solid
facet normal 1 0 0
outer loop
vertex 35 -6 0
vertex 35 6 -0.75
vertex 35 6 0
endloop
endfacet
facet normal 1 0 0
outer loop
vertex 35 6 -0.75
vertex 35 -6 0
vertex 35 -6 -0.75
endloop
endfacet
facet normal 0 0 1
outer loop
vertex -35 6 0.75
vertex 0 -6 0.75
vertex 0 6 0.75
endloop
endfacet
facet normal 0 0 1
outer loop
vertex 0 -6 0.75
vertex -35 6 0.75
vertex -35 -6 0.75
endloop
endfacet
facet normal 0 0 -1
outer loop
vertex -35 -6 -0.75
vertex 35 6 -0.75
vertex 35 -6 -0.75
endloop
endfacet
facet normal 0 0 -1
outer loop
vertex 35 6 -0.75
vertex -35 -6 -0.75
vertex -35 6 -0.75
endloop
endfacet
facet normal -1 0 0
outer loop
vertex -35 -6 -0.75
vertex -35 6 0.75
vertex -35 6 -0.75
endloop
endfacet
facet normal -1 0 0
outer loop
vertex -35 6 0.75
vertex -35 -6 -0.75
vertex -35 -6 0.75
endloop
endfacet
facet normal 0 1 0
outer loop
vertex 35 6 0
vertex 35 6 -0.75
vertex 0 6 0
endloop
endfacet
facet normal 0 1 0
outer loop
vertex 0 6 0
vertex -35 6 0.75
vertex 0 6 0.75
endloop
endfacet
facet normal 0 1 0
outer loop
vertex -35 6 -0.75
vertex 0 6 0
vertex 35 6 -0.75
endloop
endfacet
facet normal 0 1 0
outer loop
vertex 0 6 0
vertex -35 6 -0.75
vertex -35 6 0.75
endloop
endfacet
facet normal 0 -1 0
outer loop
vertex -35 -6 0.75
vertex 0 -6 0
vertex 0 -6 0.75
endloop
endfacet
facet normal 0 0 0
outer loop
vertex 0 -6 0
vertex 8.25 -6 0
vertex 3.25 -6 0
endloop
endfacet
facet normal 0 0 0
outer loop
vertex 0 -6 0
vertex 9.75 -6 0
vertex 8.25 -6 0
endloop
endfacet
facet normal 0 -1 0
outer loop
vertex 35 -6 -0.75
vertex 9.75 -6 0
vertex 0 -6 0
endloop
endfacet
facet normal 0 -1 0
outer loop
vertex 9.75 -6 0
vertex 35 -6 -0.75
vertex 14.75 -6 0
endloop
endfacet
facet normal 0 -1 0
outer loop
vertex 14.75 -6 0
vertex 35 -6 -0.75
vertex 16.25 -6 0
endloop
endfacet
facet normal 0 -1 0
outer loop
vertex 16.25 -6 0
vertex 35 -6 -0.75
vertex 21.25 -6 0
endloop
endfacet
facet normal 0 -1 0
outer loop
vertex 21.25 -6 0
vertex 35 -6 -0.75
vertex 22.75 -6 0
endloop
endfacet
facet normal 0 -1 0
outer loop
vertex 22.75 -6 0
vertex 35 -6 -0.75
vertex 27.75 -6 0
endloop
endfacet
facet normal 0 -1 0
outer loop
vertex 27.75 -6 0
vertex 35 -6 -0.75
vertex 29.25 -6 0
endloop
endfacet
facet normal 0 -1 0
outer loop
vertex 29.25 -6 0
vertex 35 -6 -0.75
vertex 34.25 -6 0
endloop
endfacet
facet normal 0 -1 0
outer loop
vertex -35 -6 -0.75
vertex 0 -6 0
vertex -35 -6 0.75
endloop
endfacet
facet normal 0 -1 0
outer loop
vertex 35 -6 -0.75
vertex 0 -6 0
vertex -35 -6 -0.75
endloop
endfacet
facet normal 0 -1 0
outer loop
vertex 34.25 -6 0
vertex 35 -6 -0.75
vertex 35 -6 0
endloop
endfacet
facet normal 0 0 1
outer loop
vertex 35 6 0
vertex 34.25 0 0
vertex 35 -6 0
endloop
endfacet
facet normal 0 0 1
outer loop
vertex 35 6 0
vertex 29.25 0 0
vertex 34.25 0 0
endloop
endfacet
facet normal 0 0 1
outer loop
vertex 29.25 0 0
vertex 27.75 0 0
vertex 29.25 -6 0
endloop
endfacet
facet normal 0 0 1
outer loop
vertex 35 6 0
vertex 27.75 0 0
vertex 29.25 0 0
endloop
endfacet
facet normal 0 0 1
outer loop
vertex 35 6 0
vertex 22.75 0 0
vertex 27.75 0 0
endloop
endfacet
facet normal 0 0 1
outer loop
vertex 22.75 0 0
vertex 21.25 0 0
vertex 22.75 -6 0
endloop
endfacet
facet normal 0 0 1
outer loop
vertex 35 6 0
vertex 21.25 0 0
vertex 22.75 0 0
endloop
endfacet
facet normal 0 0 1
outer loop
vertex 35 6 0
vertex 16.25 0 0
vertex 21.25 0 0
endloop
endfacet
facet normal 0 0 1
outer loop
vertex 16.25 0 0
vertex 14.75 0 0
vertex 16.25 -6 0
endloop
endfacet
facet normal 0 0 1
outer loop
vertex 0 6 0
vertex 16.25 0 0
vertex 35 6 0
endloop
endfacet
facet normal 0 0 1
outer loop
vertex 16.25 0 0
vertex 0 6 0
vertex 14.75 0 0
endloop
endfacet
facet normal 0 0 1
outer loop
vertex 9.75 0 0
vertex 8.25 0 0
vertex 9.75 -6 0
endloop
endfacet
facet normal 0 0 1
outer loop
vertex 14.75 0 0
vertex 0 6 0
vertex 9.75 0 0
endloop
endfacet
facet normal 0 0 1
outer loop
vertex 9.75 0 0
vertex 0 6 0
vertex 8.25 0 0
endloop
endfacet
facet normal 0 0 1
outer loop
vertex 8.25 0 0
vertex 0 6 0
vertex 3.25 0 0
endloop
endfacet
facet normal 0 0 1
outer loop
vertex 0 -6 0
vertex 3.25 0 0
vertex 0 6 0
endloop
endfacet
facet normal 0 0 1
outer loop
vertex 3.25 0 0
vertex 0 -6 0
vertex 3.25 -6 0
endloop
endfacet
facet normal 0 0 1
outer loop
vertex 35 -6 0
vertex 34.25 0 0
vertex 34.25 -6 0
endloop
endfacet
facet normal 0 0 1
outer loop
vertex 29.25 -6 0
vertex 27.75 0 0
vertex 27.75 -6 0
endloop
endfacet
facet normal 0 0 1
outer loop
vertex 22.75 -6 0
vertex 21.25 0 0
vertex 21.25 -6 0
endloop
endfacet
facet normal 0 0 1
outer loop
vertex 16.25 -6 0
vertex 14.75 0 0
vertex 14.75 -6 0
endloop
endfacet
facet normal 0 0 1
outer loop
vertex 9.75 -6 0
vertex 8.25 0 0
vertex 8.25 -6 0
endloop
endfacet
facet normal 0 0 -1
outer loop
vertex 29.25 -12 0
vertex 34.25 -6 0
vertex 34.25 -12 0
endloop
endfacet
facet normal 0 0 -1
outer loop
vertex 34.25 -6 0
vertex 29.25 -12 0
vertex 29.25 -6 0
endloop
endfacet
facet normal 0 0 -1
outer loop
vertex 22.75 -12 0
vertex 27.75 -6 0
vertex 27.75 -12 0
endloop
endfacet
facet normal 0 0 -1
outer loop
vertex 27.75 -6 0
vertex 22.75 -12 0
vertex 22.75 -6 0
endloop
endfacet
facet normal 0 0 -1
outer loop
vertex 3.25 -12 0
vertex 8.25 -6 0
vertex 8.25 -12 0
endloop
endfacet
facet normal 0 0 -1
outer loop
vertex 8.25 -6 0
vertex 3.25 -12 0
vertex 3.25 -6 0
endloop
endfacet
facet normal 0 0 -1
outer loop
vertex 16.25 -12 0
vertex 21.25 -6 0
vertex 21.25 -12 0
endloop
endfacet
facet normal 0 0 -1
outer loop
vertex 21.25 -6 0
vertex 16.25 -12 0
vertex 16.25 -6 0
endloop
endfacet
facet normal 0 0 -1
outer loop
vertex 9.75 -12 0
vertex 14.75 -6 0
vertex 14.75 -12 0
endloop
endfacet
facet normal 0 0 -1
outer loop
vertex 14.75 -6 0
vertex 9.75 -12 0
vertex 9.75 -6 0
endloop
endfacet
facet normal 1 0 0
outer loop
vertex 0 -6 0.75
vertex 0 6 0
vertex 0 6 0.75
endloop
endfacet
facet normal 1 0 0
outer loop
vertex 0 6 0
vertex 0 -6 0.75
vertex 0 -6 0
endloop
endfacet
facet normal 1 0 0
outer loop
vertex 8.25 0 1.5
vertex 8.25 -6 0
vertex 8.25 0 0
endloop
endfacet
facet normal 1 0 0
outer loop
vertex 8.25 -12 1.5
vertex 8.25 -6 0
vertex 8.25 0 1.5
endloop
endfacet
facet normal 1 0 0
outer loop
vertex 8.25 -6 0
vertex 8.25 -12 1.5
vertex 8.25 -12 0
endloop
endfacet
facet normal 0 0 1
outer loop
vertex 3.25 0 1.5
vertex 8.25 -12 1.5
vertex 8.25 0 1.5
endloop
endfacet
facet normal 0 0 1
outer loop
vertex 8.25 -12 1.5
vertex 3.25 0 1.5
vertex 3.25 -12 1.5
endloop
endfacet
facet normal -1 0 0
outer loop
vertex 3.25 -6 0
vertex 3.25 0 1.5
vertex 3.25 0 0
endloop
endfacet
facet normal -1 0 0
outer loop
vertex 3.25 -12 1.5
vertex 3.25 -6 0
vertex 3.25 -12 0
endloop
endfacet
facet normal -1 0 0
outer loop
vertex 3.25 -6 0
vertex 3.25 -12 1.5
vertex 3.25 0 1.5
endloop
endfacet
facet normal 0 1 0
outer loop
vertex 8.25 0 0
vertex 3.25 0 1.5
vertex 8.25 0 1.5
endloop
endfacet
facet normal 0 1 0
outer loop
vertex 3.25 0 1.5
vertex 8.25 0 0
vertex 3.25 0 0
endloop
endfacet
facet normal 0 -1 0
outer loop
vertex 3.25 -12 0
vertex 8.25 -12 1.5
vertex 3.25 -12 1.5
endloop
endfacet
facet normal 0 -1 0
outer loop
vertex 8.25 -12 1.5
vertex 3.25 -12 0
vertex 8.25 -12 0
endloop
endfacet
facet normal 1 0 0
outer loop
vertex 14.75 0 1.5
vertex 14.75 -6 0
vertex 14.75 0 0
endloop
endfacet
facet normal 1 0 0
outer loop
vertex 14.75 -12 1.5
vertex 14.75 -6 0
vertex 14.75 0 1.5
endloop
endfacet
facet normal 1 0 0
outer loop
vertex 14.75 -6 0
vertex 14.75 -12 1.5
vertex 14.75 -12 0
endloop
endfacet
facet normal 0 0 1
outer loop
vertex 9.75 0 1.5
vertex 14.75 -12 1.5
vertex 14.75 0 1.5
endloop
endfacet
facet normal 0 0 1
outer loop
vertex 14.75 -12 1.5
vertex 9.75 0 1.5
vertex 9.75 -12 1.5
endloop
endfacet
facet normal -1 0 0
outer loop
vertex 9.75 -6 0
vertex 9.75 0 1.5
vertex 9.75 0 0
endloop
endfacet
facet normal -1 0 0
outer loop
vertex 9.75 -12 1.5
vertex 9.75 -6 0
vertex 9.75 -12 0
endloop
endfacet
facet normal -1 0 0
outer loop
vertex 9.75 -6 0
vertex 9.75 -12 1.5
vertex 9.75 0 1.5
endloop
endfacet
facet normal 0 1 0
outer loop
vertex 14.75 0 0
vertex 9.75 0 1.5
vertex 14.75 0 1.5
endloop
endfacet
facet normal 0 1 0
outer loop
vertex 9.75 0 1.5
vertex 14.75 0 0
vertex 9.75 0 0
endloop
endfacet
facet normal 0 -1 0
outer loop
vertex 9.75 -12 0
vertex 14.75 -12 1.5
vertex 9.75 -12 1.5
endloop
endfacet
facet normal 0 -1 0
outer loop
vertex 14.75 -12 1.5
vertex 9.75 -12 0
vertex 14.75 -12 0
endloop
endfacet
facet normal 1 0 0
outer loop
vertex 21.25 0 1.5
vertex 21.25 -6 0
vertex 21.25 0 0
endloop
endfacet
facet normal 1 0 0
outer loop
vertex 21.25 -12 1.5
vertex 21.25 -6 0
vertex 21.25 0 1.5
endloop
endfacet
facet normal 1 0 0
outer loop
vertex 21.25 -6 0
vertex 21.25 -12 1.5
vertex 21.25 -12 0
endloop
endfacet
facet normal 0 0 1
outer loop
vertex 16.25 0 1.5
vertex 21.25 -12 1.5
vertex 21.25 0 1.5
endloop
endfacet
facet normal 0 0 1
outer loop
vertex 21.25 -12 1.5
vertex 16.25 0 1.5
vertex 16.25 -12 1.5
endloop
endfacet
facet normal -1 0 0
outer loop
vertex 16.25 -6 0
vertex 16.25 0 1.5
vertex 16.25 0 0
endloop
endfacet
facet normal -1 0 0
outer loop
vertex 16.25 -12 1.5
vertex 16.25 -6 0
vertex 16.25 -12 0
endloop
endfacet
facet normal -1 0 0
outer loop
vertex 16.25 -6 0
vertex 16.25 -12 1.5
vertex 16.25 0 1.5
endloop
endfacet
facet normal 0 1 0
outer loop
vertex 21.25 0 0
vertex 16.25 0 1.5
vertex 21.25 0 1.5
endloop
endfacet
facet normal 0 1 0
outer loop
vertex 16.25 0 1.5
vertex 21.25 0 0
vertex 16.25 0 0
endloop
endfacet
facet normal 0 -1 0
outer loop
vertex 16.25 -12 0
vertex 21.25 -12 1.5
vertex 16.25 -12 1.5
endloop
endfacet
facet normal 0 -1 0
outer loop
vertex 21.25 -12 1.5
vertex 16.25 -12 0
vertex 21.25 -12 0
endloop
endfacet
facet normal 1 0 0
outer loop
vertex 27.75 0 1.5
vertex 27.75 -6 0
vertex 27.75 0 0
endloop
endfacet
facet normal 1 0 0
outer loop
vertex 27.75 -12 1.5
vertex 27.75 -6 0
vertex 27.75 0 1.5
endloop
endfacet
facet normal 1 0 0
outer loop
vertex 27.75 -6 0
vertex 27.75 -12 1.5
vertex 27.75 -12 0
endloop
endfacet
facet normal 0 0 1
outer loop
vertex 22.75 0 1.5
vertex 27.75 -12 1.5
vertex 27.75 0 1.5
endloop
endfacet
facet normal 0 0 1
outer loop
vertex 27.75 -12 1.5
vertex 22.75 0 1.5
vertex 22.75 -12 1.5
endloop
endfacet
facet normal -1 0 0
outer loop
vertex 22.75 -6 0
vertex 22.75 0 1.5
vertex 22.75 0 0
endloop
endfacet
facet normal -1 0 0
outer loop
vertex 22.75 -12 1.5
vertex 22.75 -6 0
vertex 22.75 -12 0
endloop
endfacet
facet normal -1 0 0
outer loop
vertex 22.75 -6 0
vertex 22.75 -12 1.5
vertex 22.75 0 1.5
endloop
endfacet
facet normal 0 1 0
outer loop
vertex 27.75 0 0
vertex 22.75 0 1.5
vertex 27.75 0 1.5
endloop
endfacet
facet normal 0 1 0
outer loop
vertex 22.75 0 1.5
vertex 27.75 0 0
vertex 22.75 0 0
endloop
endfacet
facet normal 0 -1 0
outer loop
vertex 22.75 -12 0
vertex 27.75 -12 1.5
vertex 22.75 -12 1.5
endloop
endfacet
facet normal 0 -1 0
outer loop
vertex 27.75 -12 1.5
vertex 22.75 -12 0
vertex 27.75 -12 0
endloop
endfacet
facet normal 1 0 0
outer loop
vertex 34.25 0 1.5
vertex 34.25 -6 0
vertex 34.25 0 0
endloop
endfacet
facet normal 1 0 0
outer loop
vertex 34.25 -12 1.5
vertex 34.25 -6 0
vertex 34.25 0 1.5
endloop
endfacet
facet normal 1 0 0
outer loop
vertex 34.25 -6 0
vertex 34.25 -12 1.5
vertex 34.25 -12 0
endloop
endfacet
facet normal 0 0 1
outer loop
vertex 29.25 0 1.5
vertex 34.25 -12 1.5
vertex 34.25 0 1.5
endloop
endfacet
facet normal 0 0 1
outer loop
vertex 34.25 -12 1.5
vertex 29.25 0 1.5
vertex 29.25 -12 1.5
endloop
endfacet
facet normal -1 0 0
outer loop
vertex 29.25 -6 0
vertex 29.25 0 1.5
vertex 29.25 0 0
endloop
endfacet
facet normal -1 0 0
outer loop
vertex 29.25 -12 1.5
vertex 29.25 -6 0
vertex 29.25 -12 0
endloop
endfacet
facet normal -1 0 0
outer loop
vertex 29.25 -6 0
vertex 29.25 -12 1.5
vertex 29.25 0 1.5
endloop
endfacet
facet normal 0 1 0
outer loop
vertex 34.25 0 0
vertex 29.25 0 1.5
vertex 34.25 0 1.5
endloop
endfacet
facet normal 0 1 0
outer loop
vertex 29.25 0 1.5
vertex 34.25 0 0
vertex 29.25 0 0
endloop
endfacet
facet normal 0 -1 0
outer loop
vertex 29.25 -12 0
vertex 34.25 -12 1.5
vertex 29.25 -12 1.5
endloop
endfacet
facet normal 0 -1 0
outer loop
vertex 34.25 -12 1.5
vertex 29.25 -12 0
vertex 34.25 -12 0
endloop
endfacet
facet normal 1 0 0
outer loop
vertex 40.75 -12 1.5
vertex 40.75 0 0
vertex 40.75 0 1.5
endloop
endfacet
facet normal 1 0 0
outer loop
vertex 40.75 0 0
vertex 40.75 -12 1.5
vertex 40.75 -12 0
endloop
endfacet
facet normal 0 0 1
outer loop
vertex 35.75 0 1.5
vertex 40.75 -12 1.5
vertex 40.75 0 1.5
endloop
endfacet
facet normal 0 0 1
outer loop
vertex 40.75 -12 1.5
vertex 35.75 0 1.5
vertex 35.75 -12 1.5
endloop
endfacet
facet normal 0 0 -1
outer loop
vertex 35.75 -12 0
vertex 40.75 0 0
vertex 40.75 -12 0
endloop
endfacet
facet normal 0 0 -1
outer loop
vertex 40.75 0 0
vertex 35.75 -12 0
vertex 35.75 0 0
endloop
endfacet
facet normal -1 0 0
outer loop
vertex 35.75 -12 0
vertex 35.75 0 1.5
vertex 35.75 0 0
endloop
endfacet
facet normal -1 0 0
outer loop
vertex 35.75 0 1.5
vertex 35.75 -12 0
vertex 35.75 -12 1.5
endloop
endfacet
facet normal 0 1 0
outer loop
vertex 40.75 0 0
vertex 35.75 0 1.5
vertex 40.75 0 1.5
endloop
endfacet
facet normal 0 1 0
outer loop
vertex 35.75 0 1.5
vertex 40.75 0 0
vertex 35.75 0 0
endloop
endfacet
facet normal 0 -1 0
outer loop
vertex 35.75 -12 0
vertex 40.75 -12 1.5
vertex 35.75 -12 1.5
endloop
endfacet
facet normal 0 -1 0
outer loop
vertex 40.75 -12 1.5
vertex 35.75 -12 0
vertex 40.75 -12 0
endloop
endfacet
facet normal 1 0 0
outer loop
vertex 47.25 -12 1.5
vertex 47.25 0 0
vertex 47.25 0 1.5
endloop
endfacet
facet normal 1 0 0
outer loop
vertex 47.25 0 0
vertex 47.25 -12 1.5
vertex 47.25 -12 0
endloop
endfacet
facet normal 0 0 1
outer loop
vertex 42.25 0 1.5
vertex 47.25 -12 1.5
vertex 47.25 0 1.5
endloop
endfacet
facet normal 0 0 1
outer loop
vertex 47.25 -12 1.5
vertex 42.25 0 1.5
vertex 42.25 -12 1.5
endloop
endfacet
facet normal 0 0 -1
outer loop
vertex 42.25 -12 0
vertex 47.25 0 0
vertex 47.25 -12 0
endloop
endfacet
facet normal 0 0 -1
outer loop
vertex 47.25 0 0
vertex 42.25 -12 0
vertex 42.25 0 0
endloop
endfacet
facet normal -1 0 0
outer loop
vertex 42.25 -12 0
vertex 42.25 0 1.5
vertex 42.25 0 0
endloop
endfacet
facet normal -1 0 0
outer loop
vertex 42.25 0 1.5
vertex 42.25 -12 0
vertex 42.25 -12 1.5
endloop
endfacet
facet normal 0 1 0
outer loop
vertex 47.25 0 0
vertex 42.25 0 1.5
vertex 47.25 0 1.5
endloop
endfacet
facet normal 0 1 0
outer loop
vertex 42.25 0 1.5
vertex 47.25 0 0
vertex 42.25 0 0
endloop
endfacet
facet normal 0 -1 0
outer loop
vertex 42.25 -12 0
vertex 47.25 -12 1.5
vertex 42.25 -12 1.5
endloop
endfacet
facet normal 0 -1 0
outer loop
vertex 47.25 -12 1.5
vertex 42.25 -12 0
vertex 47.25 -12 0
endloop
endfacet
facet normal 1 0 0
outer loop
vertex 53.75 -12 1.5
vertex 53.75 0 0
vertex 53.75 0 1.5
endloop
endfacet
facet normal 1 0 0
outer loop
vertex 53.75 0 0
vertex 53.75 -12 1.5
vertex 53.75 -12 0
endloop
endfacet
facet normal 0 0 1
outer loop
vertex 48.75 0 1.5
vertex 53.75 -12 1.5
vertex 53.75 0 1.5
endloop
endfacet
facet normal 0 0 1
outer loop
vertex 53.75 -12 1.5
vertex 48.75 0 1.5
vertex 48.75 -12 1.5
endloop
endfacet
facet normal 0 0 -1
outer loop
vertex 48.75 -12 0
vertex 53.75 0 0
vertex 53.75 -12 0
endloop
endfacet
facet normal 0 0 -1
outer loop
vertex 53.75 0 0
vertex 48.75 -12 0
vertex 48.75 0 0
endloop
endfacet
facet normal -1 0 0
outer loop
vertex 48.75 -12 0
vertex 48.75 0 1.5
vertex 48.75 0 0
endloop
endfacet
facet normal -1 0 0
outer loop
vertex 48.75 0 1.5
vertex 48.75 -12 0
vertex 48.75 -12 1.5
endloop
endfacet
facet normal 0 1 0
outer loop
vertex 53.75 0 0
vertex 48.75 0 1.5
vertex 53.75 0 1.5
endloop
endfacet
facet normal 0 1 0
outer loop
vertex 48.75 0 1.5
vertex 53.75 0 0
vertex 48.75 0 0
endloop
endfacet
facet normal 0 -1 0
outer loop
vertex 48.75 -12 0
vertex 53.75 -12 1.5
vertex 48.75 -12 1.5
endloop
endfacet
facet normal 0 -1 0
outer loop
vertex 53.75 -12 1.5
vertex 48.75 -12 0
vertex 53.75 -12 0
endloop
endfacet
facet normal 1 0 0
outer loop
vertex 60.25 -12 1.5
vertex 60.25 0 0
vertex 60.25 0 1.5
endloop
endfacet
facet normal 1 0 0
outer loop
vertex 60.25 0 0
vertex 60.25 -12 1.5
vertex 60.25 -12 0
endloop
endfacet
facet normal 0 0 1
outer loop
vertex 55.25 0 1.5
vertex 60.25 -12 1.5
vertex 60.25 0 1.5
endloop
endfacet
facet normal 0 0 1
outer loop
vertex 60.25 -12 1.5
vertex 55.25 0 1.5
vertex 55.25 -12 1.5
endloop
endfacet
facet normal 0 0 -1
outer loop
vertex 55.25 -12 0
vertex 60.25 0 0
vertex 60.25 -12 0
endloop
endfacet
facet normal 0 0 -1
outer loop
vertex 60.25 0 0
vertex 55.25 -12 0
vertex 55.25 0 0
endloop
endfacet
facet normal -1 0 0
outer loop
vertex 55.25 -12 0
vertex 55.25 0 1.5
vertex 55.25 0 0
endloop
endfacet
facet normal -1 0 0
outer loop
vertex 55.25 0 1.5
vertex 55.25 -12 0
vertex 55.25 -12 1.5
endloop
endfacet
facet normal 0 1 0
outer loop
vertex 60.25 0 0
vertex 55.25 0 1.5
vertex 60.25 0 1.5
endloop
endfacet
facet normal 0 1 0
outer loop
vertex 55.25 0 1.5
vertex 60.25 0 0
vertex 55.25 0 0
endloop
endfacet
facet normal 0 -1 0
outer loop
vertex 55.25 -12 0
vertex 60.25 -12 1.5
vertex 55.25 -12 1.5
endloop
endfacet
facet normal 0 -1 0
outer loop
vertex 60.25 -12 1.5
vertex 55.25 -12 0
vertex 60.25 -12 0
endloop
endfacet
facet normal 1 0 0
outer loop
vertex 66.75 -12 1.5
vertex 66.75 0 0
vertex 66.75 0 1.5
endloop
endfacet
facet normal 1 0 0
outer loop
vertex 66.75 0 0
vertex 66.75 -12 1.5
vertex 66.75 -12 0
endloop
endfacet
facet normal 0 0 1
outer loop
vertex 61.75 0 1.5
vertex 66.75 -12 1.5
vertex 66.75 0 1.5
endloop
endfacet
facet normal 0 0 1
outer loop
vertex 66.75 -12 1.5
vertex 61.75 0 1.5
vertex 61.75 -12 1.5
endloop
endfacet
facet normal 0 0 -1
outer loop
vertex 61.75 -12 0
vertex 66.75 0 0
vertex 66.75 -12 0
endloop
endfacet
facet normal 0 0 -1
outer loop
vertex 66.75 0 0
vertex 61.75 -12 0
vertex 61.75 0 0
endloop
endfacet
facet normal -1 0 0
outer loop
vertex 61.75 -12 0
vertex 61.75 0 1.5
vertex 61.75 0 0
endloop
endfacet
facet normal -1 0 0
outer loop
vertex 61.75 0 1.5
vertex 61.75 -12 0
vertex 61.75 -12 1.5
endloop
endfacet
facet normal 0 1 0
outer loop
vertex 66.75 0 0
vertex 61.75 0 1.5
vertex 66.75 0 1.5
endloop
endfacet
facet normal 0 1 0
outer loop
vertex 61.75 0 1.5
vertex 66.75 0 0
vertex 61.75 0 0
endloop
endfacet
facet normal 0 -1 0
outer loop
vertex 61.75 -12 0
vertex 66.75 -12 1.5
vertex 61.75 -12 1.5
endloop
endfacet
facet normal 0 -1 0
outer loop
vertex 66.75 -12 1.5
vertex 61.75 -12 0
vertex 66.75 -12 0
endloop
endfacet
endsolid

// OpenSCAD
// 10-well Agarose Gel Comb
// Designed for FDM printing, lying flat on the XY plane (Z=0).
// Dimensions in millimetres.

// --- Dimensions ---
$fn = 100; // High resolution for smooth edges

// Spine dimensions
SPINE_LENGTH = 70;  // X
SPINE_WIDTH = 12;   // Y
PLATE_THICKNESS = 1.5; // Z

// Tooth dimensions
TOOTH_WIDTH = 5.0;  // X
TOOTH_LENGTH = 12;  // Y (extends from spine edge)
NUM_TEETH = 10;
GAP_SIZE = 1.5;     // Gap between teeth

// --- Calculations ---
// Total width of the tooth row
TOOTH_ROW_WIDTH = (NUM_TEETH * TOOTH_WIDTH) + ((NUM_TEETH - 1) * GAP_SIZE);

// Offset to center the tooth row on the spine in X
X_OFFSET = (SPINE_LENGTH - TOOTH_ROW_WIDTH) / 2;

// Position of the spine edge where teeth hang (in -Y direction)
// Spine goes from -SPINE_WIDTH/2 to +SPINE_WIDTH/2.
// Teeth hang from the edge at -SPINE_WIDTH/2.
SPINE_EDGE_Y = -SPINE_WIDTH / 2;

// --- Main Body (Spine) ---
// Create the flat plate spine centered at origin
difference() {
    // Outer block
    cube([SPINE_LENGTH, SPINE_WIDTH, PLATE_THICKNESS], center = true);
    
    // Cut out the area where teeth will hang to ensure clean separation.
    // We cut a rectangle slightly larger than the tooth row to remove the spine material
    // extending into the tooth area.
    // The cut starts at the spine edge (SPINE_EDGE_Y) and extends downwards (negative Y).
    // It must extend past the tooth length to ensure separation.
    translate([0, SPINE_EDGE_Y, 0]) {
        cube([SPINE_LENGTH, TOOTH_LENGTH + 0.1, PLATE_THICKNESS]);
    }
}

// --- Teeth ---
// Loop to create 10 teeth
for (i = [0 : NUM_TEETH - 1]) {
    // Calculate X position for this tooth
    // Start at X_OFFSET, add tooth width and gaps
    current_x = X_OFFSET + (i * (TOOTH_WIDTH + GAP_SIZE));
    
    // Calculate Y position for this tooth
    // Centered on the spine edge in Y.
    // Spine edge is at SPINE_EDGE_Y (-6).
    // Tooth extends TOOTH_LENGTH (12) in -Y direction.
    // So tooth goes from -6 to -18. Center is -12.
    current_y = SPINE_EDGE_Y - (TOOTH_LENGTH / 2);
    
    translate([current_x, current_y, 0]) {
        // Tooth geometry: 5mm wide (X), 12mm long (Y), 1.5mm thick (Z)
        // Since the spine was cut out, we just extrude the tooth shape.
        // Note: The tooth is printed "hanging" from the spine.
        cube([TOOTH_WIDTH, TOOTH_LENGTH, PLATE_THICKNESS], center = false);
    }
}
